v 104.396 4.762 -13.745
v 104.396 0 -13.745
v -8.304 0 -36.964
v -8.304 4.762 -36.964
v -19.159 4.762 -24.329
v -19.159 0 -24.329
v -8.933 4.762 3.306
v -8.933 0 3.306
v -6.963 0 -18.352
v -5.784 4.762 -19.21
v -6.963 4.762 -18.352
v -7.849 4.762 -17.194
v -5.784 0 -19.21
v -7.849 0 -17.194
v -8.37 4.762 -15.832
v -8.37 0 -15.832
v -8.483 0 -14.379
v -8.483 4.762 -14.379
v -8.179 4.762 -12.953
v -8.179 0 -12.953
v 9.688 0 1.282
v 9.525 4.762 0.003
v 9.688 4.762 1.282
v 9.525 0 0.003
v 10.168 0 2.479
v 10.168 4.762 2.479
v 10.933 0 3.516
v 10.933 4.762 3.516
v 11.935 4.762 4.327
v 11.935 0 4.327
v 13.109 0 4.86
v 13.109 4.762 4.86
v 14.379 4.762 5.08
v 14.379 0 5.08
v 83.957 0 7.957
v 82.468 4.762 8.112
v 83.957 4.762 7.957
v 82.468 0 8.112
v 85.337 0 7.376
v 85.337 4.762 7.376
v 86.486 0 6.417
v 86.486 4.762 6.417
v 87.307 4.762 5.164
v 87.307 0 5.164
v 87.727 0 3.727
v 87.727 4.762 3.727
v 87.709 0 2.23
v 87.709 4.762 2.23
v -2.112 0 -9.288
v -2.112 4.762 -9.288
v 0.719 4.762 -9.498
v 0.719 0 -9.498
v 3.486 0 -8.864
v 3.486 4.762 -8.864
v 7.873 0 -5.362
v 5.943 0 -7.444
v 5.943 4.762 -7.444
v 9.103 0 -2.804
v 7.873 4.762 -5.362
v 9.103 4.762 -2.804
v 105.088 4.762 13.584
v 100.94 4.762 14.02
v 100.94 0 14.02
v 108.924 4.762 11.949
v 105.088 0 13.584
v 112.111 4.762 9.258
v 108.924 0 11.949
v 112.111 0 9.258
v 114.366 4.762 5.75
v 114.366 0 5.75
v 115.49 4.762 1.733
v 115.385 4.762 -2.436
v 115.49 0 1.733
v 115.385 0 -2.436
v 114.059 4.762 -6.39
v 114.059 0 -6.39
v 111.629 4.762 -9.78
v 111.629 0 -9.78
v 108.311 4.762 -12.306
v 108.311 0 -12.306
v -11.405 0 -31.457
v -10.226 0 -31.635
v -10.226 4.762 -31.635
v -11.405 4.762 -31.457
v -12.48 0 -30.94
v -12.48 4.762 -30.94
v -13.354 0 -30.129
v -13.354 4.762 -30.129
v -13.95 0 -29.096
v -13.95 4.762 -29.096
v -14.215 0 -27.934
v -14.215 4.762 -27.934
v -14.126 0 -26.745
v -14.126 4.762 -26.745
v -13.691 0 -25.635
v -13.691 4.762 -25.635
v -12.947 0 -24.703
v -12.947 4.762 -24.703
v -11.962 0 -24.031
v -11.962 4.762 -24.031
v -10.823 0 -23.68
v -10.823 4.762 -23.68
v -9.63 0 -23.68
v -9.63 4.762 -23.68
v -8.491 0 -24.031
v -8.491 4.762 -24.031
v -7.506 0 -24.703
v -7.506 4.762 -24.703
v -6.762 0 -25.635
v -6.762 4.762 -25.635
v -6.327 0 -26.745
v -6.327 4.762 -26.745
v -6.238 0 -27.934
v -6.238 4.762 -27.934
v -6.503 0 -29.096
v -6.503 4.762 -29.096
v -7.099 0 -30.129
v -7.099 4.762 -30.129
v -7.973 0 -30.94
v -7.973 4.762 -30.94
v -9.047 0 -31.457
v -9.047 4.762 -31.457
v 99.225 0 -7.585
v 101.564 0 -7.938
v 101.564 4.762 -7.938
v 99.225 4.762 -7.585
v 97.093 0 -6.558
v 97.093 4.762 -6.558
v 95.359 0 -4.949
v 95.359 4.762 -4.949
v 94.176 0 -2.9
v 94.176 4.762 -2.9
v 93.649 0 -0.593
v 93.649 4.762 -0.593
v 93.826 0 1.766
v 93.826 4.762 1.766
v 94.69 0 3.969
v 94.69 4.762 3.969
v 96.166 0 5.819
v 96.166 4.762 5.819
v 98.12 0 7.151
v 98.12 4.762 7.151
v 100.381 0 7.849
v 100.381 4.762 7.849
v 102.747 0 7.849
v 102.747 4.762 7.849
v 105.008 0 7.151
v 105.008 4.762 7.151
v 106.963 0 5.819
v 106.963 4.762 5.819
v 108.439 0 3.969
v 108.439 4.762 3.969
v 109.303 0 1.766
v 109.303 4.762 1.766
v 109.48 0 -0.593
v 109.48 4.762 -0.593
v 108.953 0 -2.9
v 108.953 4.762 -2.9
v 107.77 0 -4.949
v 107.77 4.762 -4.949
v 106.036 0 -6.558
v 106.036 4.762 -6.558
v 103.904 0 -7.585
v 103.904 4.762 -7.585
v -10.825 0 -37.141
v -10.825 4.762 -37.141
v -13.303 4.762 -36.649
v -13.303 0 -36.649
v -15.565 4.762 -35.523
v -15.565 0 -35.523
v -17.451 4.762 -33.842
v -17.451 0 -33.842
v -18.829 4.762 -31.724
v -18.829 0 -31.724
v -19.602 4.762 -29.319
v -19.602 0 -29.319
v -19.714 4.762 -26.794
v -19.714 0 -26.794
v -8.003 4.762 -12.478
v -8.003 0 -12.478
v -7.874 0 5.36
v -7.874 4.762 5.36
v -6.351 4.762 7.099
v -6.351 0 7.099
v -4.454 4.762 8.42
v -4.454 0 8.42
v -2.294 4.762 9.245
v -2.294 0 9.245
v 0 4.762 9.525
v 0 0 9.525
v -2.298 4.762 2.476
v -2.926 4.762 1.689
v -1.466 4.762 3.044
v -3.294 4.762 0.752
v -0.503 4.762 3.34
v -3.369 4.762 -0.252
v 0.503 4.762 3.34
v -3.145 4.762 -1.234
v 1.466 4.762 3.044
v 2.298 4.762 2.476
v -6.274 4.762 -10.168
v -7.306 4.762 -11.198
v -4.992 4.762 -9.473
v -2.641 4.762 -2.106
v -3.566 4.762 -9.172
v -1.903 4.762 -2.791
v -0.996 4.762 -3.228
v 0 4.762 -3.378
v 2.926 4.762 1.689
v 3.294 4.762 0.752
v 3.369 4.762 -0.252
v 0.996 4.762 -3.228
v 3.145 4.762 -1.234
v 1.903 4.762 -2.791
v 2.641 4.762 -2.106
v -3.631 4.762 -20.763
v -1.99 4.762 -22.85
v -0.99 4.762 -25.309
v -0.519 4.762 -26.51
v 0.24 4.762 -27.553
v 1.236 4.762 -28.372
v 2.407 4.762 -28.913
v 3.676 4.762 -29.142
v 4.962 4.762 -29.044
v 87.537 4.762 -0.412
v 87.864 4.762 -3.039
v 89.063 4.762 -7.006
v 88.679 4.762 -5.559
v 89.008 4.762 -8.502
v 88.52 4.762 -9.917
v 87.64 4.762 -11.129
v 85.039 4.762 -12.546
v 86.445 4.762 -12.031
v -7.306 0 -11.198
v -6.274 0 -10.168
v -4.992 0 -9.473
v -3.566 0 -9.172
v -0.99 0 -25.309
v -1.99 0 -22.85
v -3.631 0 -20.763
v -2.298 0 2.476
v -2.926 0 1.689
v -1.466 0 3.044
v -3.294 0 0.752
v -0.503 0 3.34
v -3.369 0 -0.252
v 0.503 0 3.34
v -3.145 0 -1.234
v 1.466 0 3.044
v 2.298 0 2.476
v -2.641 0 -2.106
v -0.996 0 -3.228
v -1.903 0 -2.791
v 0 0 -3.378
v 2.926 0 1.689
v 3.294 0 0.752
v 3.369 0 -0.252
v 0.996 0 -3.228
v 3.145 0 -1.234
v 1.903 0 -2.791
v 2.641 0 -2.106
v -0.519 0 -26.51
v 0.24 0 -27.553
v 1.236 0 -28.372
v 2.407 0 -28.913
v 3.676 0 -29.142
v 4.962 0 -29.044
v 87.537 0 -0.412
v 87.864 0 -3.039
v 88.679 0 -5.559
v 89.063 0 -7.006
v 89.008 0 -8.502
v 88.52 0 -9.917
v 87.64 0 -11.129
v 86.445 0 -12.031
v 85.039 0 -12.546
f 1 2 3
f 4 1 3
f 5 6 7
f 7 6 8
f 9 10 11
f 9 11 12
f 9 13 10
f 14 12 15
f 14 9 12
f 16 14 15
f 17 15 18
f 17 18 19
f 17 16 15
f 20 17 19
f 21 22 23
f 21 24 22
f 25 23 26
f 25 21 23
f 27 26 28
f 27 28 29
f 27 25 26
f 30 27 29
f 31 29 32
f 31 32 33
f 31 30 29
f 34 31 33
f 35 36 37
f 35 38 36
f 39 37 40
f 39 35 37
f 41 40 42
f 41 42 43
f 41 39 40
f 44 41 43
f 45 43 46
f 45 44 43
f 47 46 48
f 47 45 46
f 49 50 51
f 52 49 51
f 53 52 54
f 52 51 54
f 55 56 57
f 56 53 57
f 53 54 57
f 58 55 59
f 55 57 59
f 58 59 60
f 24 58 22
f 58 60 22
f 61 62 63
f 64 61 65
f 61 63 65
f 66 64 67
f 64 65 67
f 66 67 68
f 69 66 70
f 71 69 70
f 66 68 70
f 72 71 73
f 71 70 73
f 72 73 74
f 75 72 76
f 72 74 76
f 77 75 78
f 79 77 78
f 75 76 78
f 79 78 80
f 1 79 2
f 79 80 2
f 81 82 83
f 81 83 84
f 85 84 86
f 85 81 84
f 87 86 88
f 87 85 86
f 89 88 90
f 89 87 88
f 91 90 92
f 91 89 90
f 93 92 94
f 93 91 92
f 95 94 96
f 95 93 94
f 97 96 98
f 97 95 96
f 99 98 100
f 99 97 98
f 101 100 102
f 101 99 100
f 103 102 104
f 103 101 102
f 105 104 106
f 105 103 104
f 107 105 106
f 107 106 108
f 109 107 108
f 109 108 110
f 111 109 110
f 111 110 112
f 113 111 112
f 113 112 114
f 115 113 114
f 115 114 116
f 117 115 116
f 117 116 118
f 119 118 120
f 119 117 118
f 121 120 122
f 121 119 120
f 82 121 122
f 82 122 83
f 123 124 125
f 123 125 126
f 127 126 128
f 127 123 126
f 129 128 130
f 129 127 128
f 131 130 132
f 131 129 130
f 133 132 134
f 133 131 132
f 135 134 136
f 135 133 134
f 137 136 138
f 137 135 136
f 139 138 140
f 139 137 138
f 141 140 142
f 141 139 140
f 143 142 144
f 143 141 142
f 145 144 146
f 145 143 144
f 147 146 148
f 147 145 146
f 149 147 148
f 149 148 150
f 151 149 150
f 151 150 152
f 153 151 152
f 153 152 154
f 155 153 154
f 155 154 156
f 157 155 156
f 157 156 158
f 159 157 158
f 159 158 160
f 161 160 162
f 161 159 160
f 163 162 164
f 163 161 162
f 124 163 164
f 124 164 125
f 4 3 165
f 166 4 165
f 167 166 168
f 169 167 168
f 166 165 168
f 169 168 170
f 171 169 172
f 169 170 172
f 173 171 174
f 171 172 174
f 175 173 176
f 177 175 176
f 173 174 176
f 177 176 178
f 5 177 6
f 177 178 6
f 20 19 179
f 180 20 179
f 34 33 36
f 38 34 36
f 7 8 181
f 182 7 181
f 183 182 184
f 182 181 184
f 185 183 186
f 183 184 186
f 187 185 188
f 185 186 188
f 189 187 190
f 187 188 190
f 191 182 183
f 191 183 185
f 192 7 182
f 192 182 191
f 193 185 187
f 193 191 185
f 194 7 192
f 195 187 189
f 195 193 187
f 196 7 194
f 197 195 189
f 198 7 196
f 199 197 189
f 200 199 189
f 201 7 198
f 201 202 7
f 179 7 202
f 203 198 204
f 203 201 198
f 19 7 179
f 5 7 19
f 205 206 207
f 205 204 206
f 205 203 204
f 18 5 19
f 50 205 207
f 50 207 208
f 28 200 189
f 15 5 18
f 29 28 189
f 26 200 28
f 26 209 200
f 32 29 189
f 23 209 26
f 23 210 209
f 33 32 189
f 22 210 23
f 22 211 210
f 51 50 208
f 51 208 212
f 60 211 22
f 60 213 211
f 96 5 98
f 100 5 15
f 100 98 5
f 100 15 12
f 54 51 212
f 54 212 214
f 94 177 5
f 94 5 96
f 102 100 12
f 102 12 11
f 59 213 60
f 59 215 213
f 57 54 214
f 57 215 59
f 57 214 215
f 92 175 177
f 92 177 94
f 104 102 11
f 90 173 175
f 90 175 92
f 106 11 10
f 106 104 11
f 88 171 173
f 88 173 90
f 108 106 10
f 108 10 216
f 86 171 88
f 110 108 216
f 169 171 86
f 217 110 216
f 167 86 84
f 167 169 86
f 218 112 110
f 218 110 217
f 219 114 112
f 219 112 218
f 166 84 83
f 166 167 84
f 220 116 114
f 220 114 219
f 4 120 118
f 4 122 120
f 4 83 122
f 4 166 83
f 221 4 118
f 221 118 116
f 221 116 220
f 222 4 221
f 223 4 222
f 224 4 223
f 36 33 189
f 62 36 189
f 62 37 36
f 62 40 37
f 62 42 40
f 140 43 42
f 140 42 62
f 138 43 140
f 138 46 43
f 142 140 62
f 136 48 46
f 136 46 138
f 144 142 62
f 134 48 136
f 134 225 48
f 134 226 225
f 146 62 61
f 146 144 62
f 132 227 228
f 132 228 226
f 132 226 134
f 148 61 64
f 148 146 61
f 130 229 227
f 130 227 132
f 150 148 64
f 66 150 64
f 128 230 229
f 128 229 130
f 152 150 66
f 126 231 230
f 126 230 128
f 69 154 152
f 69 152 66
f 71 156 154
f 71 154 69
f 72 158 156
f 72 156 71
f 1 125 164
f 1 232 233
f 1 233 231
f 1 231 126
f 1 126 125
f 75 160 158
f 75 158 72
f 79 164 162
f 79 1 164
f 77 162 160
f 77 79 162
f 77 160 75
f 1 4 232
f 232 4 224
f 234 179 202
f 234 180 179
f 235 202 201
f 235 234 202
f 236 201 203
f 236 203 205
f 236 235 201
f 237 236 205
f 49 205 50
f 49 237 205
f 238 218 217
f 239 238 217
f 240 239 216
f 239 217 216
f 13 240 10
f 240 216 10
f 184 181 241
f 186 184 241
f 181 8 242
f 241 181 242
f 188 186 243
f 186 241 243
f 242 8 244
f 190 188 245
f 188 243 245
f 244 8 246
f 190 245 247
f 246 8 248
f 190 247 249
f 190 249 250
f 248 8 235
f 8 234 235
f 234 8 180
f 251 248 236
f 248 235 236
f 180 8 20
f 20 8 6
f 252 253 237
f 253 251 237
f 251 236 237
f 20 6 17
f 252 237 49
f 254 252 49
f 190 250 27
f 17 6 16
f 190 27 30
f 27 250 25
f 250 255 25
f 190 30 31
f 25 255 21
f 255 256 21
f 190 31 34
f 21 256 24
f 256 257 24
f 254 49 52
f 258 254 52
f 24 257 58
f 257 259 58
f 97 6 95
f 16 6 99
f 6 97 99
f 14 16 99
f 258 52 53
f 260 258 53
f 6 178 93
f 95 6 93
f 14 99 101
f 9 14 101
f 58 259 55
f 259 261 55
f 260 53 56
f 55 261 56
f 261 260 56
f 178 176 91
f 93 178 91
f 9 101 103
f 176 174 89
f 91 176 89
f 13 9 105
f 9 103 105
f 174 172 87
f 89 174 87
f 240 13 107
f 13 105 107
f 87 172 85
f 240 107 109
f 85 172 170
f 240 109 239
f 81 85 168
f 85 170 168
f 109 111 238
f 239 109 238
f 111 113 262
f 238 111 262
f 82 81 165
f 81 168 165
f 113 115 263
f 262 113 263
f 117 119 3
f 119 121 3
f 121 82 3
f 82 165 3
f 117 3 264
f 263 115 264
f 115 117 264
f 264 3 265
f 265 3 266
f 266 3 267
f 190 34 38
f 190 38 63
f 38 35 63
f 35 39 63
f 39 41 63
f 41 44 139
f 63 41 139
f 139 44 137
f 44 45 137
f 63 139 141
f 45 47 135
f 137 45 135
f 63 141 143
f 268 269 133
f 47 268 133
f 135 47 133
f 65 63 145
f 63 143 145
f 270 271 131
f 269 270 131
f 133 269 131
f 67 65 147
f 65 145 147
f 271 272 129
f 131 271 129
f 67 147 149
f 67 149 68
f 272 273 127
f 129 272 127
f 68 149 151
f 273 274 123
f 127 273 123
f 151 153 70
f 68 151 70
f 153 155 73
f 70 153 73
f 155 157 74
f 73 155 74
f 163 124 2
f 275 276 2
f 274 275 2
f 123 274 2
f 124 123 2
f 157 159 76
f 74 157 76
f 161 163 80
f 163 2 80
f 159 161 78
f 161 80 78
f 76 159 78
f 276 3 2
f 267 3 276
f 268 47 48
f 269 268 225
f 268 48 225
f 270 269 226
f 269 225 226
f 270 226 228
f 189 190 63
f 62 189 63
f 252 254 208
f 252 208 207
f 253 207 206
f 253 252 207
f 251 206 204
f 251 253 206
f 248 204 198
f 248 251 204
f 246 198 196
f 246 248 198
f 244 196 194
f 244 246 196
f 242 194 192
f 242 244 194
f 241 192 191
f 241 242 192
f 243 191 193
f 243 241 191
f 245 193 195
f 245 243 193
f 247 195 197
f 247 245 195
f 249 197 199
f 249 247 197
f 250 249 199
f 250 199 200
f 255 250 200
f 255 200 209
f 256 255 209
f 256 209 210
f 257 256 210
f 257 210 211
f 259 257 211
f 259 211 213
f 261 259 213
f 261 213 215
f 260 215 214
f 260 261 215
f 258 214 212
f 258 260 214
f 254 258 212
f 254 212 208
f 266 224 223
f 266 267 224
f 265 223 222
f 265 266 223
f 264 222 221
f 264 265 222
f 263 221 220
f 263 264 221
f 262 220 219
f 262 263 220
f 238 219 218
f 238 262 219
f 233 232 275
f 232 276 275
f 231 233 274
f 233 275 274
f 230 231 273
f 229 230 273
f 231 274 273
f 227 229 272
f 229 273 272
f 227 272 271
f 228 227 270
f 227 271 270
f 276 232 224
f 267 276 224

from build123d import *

# Parameters (mm, degrees)
SKETCH1_R           = 4
SKETCH1_R_2         = 7.9375
SKETCH1_R_3         = 3.3782
BOSS_EXTRUDE2_DEPTH = 4.7625
CUT_EXTRUDE1_DEPTH  = 122.517222726
FILLET1_R           = 5.08


with BuildPart() as part:
    # Sketch1 → Boss-Extrude2 (new body)
    with BuildSketch(Plane(origin=(0, 0, 0), x_dir=(1, 0, 0), z_dir=(0, 1, 0))):
        with BuildLine():
            Line((104.396235267, 13.744819308), (-8.304416732, 36.964125856))
            ThreePointArc((-8.304416732, 36.964125856), (-17.451234138, 33.842164964), (-19.159429037, 24.329385209))
            Line((-19.159429037, 24.329385209), (-8.932978723, -3.305679376))
            ThreePointArc((-8.932978723, -3.305679376), (-5.442381324, -7.817039755), (0, -9.525))
            Line((0, -9.525), (100.940182628, -14.019608589))
            ThreePointArc((100.940182628, -14.019608589), (115.490464917, -1.733479809), (104.396235267, 13.744819308))
        make_face()
        with Locations((-10.226449718, 27.635062977)):
            Circle(SKETCH1_R, mode=Mode.SUBTRACT)
        with Locations((101.56444, 0)):
            Circle(SKETCH1_R_2, mode=Mode.SUBTRACT)
        Circle(SKETCH1_R_3, mode=Mode.SUBTRACT)
    extrude(amount=BOSS_EXTRUDE2_DEPTH)

    # Sketch2 → Cut-Extrude1 (cut, through all)
    with BuildSketch(Plane(origin=(0, 4.7625, 0), x_dir=(1, 0, 0), z_dir=(0, 1, 0))):
        with BuildLine():
            Line((-10.087484888, 18.111076743), (-6.094283979, 7.320199983))
            ThreePointArc((-6.094283979, 7.320199983), (6.155929185, 7.26843593), (8.223542142, -4.806139786))
            Line((8.223542142, -4.806139786), (90.370654862, -8.463940958))
            ThreePointArc((90.370654862, -8.463940958), (87.638415083, 1.733479809), (92.787243401, 10.949883201))
            Line((92.787243401, 10.949883201), (-1.078567334, 30.28871572))
            ThreePointArc((-1.078567334, 30.28871572), (-2.569093415, 21.970213513), (-10.087484888, 18.111076743))
        make_face()
    extrude(amount=-CUT_EXTRUDE1_DEPTH, mode=Mode.SUBTRACT)

    # Fillet1
    fillet1_edges = [part.edges().sort_by_distance(p)[0] for p in [
        (-10.087484888, 2.38125, -18.111076743),
        (-6.094283979, 2.38125, -7.320199983),
        (92.787243401, 2.38125, -10.949883201),
        (90.370654862, 2.38125, 8.463940958),
        (-1.078567334, 2.38125, -30.28871572),
        (8.223542142, 2.38125, 4.806139786),
    ]]
    fillet(fillet1_edges, radius=FILLET1_R)


solid = part.part
